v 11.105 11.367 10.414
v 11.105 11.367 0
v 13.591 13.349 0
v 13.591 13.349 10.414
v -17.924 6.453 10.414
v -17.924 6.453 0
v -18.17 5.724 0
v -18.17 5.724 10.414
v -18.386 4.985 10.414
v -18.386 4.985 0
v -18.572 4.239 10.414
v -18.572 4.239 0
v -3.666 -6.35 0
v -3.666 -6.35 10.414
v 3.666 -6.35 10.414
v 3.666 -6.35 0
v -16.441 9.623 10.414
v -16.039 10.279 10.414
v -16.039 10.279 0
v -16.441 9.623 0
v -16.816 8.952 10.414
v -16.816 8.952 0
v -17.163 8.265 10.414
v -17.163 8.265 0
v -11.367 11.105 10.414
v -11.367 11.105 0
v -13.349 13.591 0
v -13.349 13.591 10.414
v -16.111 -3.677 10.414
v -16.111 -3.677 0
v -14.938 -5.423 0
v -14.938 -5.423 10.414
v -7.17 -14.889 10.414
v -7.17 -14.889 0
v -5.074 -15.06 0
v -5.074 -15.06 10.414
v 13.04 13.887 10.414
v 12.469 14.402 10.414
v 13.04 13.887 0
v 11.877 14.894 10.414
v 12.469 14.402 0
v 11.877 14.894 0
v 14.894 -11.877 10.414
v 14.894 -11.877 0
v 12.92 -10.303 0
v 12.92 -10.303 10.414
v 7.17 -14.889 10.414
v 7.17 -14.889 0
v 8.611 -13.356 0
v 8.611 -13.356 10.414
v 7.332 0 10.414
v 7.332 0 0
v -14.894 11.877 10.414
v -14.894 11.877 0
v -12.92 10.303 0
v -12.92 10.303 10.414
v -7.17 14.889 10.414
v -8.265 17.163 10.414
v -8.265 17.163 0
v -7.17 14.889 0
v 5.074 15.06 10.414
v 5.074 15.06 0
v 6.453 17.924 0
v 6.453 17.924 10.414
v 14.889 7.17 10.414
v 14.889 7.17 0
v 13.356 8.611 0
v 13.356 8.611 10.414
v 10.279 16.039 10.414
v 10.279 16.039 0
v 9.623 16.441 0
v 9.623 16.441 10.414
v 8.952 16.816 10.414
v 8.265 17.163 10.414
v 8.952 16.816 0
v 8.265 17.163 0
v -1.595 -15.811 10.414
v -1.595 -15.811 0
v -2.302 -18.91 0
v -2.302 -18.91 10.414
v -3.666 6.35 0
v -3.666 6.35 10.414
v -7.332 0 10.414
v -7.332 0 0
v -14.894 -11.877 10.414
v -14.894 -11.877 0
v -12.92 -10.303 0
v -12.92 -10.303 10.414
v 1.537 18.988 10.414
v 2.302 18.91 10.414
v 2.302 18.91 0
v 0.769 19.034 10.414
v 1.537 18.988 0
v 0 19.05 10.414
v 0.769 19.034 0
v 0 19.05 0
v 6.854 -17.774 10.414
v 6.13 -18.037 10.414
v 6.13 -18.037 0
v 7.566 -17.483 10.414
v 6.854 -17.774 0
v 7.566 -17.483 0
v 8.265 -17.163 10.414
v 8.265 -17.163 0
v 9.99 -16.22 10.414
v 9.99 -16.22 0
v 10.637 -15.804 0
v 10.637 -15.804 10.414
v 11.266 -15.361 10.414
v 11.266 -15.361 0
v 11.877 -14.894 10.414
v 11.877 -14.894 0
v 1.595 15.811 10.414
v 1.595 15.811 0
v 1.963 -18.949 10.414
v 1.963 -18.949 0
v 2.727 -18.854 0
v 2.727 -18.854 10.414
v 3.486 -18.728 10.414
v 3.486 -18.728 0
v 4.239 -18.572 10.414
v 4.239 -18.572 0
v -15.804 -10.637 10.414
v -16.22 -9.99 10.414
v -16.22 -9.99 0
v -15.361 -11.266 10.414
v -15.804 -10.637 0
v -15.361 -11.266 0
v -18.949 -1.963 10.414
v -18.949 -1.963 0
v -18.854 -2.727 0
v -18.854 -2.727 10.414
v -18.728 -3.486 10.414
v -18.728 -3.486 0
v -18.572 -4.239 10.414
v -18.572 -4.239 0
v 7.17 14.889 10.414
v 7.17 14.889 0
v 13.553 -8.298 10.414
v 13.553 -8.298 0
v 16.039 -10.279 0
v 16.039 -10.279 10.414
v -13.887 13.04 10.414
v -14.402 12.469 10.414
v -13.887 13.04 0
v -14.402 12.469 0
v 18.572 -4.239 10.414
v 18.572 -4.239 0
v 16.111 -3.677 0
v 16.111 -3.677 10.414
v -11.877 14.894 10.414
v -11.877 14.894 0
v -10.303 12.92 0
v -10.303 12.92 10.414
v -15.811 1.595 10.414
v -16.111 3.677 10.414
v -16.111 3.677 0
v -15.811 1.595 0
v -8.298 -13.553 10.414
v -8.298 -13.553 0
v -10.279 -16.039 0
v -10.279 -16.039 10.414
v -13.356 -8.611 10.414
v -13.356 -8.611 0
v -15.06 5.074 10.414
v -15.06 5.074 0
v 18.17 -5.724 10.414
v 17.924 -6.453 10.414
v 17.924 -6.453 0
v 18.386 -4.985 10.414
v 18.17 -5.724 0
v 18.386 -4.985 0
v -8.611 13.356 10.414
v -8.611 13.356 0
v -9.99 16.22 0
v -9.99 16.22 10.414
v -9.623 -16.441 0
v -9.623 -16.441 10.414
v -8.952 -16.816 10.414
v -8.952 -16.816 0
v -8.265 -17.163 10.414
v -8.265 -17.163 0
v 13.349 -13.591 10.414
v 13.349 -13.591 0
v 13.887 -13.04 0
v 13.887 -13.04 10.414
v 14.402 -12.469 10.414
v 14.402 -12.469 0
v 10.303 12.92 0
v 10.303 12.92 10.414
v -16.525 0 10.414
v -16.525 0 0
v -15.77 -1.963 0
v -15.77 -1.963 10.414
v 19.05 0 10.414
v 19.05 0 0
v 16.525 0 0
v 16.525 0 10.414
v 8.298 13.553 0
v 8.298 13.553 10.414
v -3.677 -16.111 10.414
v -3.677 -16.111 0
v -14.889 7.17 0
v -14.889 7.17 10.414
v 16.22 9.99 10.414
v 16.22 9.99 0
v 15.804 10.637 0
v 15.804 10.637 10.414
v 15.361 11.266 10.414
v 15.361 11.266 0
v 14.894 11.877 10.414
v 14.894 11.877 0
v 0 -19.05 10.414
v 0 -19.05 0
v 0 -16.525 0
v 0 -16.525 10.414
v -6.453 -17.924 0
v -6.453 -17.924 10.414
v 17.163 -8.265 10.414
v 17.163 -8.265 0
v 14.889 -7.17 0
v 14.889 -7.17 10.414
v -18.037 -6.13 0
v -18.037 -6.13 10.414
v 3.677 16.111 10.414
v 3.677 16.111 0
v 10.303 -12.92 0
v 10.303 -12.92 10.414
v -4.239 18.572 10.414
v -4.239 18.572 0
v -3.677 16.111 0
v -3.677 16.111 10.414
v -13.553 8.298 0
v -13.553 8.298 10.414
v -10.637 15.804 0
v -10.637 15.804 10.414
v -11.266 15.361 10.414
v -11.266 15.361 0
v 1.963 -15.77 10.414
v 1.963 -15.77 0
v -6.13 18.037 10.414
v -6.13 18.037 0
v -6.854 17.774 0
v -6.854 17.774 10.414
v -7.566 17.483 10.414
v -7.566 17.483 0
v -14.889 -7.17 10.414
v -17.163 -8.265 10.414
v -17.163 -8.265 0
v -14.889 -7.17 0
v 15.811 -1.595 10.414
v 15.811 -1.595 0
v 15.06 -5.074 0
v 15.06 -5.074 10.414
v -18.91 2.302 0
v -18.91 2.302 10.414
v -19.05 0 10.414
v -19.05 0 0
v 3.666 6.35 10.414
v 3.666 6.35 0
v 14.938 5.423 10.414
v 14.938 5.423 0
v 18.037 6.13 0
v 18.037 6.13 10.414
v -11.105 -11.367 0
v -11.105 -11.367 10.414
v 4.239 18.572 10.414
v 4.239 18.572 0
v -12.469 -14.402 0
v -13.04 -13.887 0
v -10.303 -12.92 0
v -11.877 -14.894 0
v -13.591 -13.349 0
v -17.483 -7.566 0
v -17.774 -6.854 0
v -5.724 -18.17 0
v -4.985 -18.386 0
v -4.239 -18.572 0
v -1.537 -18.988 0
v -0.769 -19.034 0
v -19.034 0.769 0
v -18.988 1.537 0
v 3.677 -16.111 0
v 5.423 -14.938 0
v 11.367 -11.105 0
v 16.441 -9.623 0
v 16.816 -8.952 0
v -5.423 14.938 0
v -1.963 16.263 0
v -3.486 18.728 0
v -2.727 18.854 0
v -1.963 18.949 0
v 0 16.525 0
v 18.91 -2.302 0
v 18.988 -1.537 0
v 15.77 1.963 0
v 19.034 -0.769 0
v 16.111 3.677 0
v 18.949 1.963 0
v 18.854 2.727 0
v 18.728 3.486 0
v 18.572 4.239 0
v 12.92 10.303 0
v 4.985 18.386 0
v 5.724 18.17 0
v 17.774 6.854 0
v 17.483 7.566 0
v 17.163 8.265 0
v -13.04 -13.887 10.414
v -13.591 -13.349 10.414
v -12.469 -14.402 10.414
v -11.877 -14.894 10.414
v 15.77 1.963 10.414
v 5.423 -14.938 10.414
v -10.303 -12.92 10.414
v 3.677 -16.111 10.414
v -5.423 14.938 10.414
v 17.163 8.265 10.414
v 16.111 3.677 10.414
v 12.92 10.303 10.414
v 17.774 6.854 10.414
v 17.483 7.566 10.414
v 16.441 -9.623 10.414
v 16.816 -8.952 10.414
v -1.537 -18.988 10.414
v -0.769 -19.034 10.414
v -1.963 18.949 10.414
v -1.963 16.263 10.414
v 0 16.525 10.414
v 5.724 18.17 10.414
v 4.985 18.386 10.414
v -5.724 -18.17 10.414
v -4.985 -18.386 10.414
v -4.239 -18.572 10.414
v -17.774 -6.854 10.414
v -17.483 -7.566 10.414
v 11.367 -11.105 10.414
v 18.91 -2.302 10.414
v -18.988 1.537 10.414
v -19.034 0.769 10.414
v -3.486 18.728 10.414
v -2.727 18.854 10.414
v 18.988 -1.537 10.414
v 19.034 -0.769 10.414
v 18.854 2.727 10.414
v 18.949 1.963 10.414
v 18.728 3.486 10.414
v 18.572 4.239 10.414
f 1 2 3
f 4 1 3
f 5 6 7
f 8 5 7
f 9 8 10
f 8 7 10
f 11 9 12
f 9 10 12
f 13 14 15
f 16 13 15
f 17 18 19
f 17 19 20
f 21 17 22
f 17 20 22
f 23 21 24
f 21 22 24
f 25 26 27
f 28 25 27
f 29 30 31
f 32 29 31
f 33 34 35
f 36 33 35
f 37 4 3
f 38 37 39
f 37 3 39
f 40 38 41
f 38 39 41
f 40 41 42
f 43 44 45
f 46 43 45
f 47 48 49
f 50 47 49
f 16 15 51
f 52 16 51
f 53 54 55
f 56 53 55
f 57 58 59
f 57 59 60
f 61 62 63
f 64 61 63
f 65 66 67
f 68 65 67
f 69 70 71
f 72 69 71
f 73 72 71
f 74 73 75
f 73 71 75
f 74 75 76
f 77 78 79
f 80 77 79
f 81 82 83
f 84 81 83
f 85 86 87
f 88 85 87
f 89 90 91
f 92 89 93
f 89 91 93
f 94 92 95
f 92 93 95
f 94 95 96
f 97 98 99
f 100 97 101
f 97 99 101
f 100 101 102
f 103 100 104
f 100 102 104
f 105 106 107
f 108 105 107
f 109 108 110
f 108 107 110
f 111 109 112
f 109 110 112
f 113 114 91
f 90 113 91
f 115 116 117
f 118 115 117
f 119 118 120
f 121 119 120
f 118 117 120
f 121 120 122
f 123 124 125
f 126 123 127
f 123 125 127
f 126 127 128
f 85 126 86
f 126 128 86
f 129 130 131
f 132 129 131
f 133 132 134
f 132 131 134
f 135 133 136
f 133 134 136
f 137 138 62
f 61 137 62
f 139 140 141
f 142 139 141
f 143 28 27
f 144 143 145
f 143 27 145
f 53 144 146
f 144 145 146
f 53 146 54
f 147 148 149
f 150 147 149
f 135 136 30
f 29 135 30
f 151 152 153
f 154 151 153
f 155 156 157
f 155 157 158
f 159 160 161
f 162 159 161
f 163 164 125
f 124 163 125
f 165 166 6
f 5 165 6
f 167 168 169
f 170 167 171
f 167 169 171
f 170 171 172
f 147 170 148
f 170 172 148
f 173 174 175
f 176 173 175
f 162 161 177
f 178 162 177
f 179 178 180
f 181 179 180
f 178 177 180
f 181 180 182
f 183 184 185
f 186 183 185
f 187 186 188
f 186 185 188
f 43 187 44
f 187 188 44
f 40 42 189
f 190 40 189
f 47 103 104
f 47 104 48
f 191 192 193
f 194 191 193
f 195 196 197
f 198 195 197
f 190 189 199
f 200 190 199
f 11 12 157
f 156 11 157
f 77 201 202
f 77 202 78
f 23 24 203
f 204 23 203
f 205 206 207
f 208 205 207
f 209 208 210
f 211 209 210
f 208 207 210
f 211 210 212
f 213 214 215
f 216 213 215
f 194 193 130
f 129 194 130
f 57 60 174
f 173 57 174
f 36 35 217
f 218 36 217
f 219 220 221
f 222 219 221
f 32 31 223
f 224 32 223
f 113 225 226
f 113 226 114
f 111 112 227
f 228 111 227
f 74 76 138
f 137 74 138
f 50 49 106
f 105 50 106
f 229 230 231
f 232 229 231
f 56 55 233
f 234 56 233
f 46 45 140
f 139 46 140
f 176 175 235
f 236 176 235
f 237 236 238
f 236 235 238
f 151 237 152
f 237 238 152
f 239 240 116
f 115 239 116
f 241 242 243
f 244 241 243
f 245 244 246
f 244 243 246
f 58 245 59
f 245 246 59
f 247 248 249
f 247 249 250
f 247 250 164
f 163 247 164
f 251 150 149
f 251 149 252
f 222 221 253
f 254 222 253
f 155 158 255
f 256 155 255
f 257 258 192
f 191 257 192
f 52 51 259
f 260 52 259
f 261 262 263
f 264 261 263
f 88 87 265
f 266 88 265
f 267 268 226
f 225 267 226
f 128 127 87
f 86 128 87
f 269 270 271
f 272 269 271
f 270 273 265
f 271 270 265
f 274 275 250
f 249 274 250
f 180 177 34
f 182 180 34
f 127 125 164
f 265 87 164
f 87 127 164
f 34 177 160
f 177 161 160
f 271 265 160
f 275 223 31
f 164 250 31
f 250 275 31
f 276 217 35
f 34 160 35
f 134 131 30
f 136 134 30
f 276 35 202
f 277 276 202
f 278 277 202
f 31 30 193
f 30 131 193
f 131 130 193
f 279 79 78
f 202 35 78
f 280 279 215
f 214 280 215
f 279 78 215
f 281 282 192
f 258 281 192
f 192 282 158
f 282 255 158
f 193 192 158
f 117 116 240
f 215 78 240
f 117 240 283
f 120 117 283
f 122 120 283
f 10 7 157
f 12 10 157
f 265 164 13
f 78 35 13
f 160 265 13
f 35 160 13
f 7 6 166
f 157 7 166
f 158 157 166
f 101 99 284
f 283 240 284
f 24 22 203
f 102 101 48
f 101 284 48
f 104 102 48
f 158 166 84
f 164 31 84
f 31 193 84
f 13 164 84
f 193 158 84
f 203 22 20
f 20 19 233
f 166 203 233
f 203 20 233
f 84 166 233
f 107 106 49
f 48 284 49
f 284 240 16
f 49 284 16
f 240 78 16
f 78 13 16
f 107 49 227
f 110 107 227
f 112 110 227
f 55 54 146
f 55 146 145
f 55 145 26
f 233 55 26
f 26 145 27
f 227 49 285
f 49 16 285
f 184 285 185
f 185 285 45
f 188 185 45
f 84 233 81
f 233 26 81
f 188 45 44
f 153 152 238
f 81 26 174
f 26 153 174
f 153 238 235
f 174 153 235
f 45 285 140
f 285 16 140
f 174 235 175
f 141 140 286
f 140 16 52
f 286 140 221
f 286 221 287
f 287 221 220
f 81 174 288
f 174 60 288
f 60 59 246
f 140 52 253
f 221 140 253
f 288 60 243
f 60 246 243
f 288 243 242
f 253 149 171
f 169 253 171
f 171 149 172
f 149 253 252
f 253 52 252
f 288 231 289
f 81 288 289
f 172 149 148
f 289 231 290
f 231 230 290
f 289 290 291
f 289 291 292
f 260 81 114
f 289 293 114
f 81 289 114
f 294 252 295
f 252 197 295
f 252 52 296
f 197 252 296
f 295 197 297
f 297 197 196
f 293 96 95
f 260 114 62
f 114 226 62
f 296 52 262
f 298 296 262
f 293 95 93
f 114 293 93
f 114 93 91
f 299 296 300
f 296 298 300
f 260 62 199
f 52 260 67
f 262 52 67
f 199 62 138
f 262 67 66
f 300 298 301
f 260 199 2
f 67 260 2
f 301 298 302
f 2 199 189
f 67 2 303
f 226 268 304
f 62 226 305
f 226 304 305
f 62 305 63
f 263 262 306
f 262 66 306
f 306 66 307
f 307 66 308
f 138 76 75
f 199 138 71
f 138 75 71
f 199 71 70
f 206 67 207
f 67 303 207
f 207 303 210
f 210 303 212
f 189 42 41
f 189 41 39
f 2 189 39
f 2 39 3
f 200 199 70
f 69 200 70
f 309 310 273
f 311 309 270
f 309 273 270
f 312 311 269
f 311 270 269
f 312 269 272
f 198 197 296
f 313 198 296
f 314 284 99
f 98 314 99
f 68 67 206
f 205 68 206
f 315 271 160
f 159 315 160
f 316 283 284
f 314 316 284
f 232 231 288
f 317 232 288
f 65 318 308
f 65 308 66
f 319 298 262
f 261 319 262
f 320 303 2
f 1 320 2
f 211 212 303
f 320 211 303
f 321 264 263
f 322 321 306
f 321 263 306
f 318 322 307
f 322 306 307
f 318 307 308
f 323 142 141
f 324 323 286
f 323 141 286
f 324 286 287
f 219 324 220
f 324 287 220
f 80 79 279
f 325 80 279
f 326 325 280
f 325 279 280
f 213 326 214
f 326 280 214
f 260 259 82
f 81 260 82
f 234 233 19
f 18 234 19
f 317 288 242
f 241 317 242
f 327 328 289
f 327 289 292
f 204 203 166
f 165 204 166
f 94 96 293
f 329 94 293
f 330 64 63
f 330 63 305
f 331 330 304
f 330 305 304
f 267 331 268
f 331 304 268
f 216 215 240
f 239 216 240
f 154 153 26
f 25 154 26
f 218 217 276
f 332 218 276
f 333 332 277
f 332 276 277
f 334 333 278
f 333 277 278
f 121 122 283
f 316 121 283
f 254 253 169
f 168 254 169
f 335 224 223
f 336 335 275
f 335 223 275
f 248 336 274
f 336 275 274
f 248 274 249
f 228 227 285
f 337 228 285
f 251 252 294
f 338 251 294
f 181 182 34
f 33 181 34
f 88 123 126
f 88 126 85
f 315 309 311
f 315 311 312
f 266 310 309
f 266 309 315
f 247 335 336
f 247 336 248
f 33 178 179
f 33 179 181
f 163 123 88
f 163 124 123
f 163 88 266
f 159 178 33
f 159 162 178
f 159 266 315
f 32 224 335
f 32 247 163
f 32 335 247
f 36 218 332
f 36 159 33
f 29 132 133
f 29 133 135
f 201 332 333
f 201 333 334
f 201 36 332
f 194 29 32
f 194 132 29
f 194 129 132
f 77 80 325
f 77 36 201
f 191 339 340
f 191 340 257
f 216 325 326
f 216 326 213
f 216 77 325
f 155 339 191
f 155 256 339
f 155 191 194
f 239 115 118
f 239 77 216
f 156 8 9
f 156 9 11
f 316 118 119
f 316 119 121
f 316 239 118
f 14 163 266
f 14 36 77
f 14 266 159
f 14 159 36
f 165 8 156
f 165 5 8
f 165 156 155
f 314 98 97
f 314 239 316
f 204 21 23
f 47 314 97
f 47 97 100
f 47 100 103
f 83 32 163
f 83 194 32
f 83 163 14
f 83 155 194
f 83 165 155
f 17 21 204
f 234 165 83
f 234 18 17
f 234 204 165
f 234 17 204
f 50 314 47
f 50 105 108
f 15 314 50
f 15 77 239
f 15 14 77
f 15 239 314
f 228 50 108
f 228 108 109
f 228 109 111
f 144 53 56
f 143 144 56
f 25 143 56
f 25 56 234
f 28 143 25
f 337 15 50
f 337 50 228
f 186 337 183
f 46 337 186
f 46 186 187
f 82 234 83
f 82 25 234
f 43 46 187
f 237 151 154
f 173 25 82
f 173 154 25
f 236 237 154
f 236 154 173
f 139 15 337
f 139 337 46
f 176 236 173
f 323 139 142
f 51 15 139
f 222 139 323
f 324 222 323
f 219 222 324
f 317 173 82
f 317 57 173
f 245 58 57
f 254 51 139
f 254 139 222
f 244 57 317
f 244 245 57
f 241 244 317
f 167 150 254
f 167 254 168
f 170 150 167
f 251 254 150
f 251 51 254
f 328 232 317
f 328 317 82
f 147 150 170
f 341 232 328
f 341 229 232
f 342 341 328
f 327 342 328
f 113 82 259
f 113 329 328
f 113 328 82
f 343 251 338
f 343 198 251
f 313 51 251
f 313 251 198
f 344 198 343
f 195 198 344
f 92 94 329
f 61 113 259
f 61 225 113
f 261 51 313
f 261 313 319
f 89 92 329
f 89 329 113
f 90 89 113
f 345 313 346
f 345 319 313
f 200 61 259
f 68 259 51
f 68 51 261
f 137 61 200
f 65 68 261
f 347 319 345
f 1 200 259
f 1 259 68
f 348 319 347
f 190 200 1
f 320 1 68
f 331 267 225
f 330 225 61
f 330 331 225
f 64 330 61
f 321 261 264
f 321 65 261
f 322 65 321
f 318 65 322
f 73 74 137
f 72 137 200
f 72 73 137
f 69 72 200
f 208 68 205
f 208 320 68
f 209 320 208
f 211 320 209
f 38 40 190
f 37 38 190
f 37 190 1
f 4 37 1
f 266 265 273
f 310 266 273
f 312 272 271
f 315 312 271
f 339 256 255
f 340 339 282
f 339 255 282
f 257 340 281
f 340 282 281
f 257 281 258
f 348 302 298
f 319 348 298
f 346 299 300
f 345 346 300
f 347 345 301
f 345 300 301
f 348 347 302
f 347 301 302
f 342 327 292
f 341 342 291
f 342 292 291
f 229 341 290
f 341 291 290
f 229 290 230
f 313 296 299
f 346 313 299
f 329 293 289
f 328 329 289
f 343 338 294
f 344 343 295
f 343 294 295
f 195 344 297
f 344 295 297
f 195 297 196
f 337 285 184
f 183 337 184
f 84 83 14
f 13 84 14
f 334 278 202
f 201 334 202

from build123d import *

# Parameters (mm, degrees)
SKETCH1_R           = 19.05
BOSS_EXTRUDE1_DEPTH = 10.414
CUT_EXTRUDE1_DEPTH  = 10.414
CUT_EXTRUDE2_START  = -127
CUT_EXTRUDE2_DEPTH  = 127


with BuildPart() as part:
    # Sketch1 → Boss-Extrude1 (new body)
    with BuildSketch(Plane.XY):
        Circle(SKETCH1_R)
    extrude(amount=BOSS_EXTRUDE1_DEPTH)

    # Sketch2 → Cut-Extrude1 (cut)
    with BuildSketch(Plane.XY.offset(10.414)):
        Polygon((-7.332348419, 0), (-3.666174209, -6.35), (3.666174209, -6.35), (7.332348419, 0), (3.666174209, 6.35), (-3.666174209, 6.35), align=None)
    extrude(amount=-CUT_EXTRUDE1_DEPTH, mode=Mode.SUBTRACT)

    # Sketch3 → Cut-Extrude2 (cut)
    with BuildSketch(Plane.XY.offset(10.414).offset(CUT_EXTRUDE2_START)):
        with BuildLine():
            Line((0, 19.05), (0, 16.525205144))
            Line((0, 16.525205144), (-1.963187207, 16.262621871))
            Line((-1.963187207, 16.262621871), (-1.963187207, 18.9485724))
            ThreePointArc((-1.963187207, 18.9485724), (-0.982902788, 19.024626202), (0, 19.05))
        make_face()
        with BuildLine():
            Line((3.677204083, 16.11088375), (1.595179024, 15.811419173))
            Line((1.595179024, 15.811419173), (2.302488023, 18.910342379))
            ThreePointArc((2.302488023, 18.910342379), (3.275118227, 18.766355549), (4.239023792, 18.572376727))
            Line((4.239023792, 18.572376727), (3.677204083, 16.11088375))
        make_face()
        with BuildLine():
            Line((7.170017798, 14.888695371), (5.073556317, 15.060033157))
            Line((5.073556317, 15.060033157), (6.452706889, 17.923868829))
            ThreePointArc((6.452706889, 17.923868829), (7.368911139, 17.567061468), (8.26548523, 17.163456934))
            Line((8.26548523, 17.163456934), (7.170017798, 14.888695371))
        make_face()
        with BuildLine():
            Line((10.303296881, 12.919925636), (8.297524311, 13.553474193))
            Line((8.297524311, 13.553474193), (10.279360087, 16.038617653))
            ThreePointArc((10.279360087, 16.038617653), (11.093196077, 15.486881571), (11.877480725, 14.893889741))
            Line((11.877480725, 14.893889741), (10.303296881, 12.919925636))
        make_face()
        with BuildLine():
            Line((12.919925636, 10.303296881), (11.105419788, 11.367287439))
            Line((11.105419788, 11.367287439), (13.590563248, 13.349123215))
            ThreePointArc((13.590563248, 13.349123215), (14.261221842, 12.630124765), (14.893889741, 11.877480725))
            Line((14.893889741, 11.877480725), (12.919925636, 10.303296881))
        make_face()
        with BuildLine():
            Line((14.888695371, 7.170017798), (13.356443146, 8.611097427))
            Line((13.356443146, 8.611097427), (16.220278818, 9.990247999))
            ThreePointArc((16.220278818, 9.990247999), (16.714130394, 9.140040764), (17.163456934, 8.26548523))
            Line((17.163456934, 8.26548523), (14.888695371, 7.170017798))
        make_face()
        with BuildLine():
            Line((16.11088375, 3.677204083), (14.937718672, 5.423111033))
            Line((14.937718672, 5.423111033), (18.036641878, 6.130420032))
            ThreePointArc((18.036641878, 6.130420032), (18.328922656, 5.191636954), (18.572376727, 4.239023792))
            Line((18.572376727, 4.239023792), (16.11088375, 3.677204083))
        make_face()
        with BuildLine():
            Line((16.525205144, 0), (15.76995461, 1.963187207))
            Line((15.76995461, 1.963187207), (18.9485724, 1.963187207))
            ThreePointArc((18.9485724, 1.963187207), (19.024626202, 0.982902788), (19.05, 0))
            Line((19.05, 0), (16.525205144, 0))
        make_face()
        with BuildLine():
            Line((16.11088375, -3.677204083), (15.811419173, -1.595179024))
            Line((15.811419173, -1.595179024), (18.910342379, -2.302488023))
            ThreePointArc((18.910342379, -2.302488023), (18.766355549, -3.275118227), (18.572376727, -4.239023792))
            Line((18.572376727, -4.239023792), (16.11088375, -3.677204083))
        make_face()
        with BuildLine():
            Line((14.888695371, -7.170017798), (15.060033157, -5.073556317))
            Line((15.060033157, -5.073556317), (17.923868829, -6.452706889))
            ThreePointArc((17.923868829, -6.452706889), (17.567061468, -7.368911139), (17.163456934, -8.26548523))
            Line((17.163456934, -8.26548523), (14.888695371, -7.170017798))
        make_face()
        with BuildLine():
            Line((12.919925636, -10.303296881), (13.553474193, -8.297524311))
            Line((13.553474193, -8.297524311), (16.038617653, -10.279360087))
            ThreePointArc((16.038617653, -10.279360087), (15.486881571, -11.093196077), (14.893889741, -11.877480725))
            Line((14.893889741, -11.877480725), (12.919925636, -10.303296881))
        make_face()
        with BuildLine():
            Line((10.303296881, -12.919925636), (11.367287439, -11.105419788))
            Line((11.367287439, -11.105419788), (13.349123215, -13.590563248))
            ThreePointArc((13.349123215, -13.590563248), (12.630124765, -14.261221842), (11.877480725, -14.893889741))
            Line((11.877480725, -14.893889741), (10.303296881, -12.919925636))
        make_face()
        with BuildLine():
            Line((7.170017798, -14.888695371), (8.611097427, -13.356443146))
            Line((8.611097427, -13.356443146), (9.990247999, -16.220278818))
            ThreePointArc((9.990247999, -16.220278818), (9.140040764, -16.714130394), (8.26548523, -17.163456934))
            Line((8.26548523, -17.163456934), (7.170017798, -14.888695371))
        make_face()
        with BuildLine():
            Line((3.677204083, -16.11088375), (5.423111033, -14.937718672))
            Line((5.423111033, -14.937718672), (6.130420032, -18.036641878))
            ThreePointArc((6.130420032, -18.036641878), (5.191636954, -18.328922656), (4.239023792, -18.572376727))
            Line((4.239023792, -18.572376727), (3.677204083, -16.11088375))
        make_face()
        with BuildLine():
            Line((0, -16.525205144), (1.963187207, -15.76995461))
            Line((1.963187207, -15.76995461), (1.963187207, -18.9485724))
            ThreePointArc((1.963187207, -18.9485724), (0.982902788, -19.024626202), (0, -19.05))
            Line((0, -19.05), (0, -16.525205144))
        make_face()
        with BuildLine():
            Line((-3.677204083, -16.11088375), (-1.595179024, -15.811419173))
            Line((-1.595179024, -15.811419173), (-2.302488023, -18.910342379))
            ThreePointArc((-2.302488023, -18.910342379), (-3.275118227, -18.766355549), (-4.239023792, -18.572376727))
            Line((-4.239023792, -18.572376727), (-3.677204083, -16.11088375))
        make_face()
        with BuildLine():
            Line((-7.170017798, -14.888695371), (-5.073556317, -15.060033157))
            Line((-5.073556317, -15.060033157), (-6.452706889, -17.923868829))
            ThreePointArc((-6.452706889, -17.923868829), (-7.368911139, -17.567061468), (-8.26548523, -17.163456934))
            Line((-8.26548523, -17.163456934), (-7.170017798, -14.888695371))
        make_face()
        with BuildLine():
            Line((-10.303296881, -12.919925636), (-8.297524311, -13.553474193))
            Line((-8.297524311, -13.553474193), (-10.279360087, -16.038617653))
            ThreePointArc((-10.279360087, -16.038617653), (-11.093196077, -15.486881571), (-11.877480725, -14.893889741))
            Line((-11.877480725, -14.893889741), (-10.303296881, -12.919925636))
        make_face()
        with BuildLine():
            Line((-12.919925636, -10.303296881), (-11.105419788, -11.367287439))
            Line((-11.105419788, -11.367287439), (-13.590563248, -13.349123215))
            ThreePointArc((-13.590563248, -13.349123215), (-14.261221842, -12.630124765), (-14.893889741, -11.877480725))
            Line((-14.893889741, -11.877480725), (-12.919925636, -10.303296881))
        make_face()
        with BuildLine():
            Line((-14.888695371, -7.170017798), (-13.356443146, -8.611097427))
            Line((-13.356443146, -8.611097427), (-16.220278818, -9.990247999))
            ThreePointArc((-16.220278818, -9.990247999), (-16.714130394, -9.140040764), (-17.163456934, -8.26548523))
            Line((-17.163456934, -8.26548523), (-14.888695371, -7.170017798))
        make_face()
        with BuildLine():
            Line((-16.11088375, -3.677204083), (-14.937718672, -5.423111033))
            Line((-14.937718672, -5.423111033), (-18.036641878, -6.130420032))
            ThreePointArc((-18.036641878, -6.130420032), (-18.328922656, -5.191636954), (-18.572376727, -4.239023792))
            Line((-18.572376727, -4.239023792), (-16.11088375, -3.677204083))
        make_face()
        with BuildLine():
            Line((-16.525205144, 0), (-15.76995461, -1.963187207))
            Line((-15.76995461, -1.963187207), (-18.9485724, -1.963187207))
            ThreePointArc((-18.9485724, -1.963187207), (-19.024626202, -0.982902788), (-19.05, 0))
            Line((-19.05, 0), (-16.525205144, 0))
        make_face()
        with BuildLine():
            Line((-16.11088375, 3.677204083), (-15.811419173, 1.595179024))
            Line((-15.811419173, 1.595179024), (-18.910342379, 2.302488023))
            ThreePointArc((-18.910342379, 2.302488023), (-18.766355549, 3.275118227), (-18.572376727, 4.239023792))
            Line((-18.572376727, 4.239023792), (-16.11088375, 3.677204083))
        make_face()
        with BuildLine():
            Line((-14.888695371, 7.170017798), (-15.060033157, 5.073556317))
            Line((-15.060033157, 5.073556317), (-17.923868829, 6.452706889))
            ThreePointArc((-17.923868829, 6.452706889), (-17.567061468, 7.368911139), (-17.163456934, 8.26548523))
            Line((-17.163456934, 8.26548523), (-14.888695371, 7.170017798))
        make_face()
        with BuildLine():
            Line((-12.919925636, 10.303296881), (-13.553474193, 8.297524311))
            Line((-13.553474193, 8.297524311), (-16.038617653, 10.279360087))
            ThreePointArc((-16.038617653, 10.279360087), (-15.486881571, 11.093196077), (-14.893889741, 11.877480725))
            Line((-14.893889741, 11.877480725), (-12.919925636, 10.303296881))
        make_face()
        with BuildLine():
            Line((-10.303296881, 12.919925636), (-11.367287439, 11.105419788))
            Line((-11.367287439, 11.105419788), (-13.349123215, 13.590563248))
            ThreePointArc((-13.349123215, 13.590563248), (-12.630124765, 14.261221842), (-11.877480725, 14.893889741))
            Line((-11.877480725, 14.893889741), (-10.303296881, 12.919925636))
        make_face()
        with BuildLine():
            Line((-7.170017798, 14.888695371), (-8.611097427, 13.356443146))
            Line((-8.611097427, 13.356443146), (-9.990247999, 16.220278818))
            ThreePointArc((-9.990247999, 16.220278818), (-9.140040764, 16.714130394), (-8.26548523, 17.163456934))
            Line((-8.26548523, 17.163456934), (-7.170017798, 14.888695371))
        make_face()
        with BuildLine():
            Line((-3.677204083, 16.11088375), (-5.423111033, 14.937718672))
            Line((-5.423111033, 14.937718672), (-6.130420032, 18.036641878))
            ThreePointArc((-6.130420032, 18.036641878), (-5.191636954, 18.328922656), (-4.239023792, 18.572376727))
            Line((-4.239023792, 18.572376727), (-3.677204083, 16.11088375))
        make_face()
    extrude(amount=CUT_EXTRUDE2_DEPTH, mode=Mode.SUBTRACT)


solid = part.part
